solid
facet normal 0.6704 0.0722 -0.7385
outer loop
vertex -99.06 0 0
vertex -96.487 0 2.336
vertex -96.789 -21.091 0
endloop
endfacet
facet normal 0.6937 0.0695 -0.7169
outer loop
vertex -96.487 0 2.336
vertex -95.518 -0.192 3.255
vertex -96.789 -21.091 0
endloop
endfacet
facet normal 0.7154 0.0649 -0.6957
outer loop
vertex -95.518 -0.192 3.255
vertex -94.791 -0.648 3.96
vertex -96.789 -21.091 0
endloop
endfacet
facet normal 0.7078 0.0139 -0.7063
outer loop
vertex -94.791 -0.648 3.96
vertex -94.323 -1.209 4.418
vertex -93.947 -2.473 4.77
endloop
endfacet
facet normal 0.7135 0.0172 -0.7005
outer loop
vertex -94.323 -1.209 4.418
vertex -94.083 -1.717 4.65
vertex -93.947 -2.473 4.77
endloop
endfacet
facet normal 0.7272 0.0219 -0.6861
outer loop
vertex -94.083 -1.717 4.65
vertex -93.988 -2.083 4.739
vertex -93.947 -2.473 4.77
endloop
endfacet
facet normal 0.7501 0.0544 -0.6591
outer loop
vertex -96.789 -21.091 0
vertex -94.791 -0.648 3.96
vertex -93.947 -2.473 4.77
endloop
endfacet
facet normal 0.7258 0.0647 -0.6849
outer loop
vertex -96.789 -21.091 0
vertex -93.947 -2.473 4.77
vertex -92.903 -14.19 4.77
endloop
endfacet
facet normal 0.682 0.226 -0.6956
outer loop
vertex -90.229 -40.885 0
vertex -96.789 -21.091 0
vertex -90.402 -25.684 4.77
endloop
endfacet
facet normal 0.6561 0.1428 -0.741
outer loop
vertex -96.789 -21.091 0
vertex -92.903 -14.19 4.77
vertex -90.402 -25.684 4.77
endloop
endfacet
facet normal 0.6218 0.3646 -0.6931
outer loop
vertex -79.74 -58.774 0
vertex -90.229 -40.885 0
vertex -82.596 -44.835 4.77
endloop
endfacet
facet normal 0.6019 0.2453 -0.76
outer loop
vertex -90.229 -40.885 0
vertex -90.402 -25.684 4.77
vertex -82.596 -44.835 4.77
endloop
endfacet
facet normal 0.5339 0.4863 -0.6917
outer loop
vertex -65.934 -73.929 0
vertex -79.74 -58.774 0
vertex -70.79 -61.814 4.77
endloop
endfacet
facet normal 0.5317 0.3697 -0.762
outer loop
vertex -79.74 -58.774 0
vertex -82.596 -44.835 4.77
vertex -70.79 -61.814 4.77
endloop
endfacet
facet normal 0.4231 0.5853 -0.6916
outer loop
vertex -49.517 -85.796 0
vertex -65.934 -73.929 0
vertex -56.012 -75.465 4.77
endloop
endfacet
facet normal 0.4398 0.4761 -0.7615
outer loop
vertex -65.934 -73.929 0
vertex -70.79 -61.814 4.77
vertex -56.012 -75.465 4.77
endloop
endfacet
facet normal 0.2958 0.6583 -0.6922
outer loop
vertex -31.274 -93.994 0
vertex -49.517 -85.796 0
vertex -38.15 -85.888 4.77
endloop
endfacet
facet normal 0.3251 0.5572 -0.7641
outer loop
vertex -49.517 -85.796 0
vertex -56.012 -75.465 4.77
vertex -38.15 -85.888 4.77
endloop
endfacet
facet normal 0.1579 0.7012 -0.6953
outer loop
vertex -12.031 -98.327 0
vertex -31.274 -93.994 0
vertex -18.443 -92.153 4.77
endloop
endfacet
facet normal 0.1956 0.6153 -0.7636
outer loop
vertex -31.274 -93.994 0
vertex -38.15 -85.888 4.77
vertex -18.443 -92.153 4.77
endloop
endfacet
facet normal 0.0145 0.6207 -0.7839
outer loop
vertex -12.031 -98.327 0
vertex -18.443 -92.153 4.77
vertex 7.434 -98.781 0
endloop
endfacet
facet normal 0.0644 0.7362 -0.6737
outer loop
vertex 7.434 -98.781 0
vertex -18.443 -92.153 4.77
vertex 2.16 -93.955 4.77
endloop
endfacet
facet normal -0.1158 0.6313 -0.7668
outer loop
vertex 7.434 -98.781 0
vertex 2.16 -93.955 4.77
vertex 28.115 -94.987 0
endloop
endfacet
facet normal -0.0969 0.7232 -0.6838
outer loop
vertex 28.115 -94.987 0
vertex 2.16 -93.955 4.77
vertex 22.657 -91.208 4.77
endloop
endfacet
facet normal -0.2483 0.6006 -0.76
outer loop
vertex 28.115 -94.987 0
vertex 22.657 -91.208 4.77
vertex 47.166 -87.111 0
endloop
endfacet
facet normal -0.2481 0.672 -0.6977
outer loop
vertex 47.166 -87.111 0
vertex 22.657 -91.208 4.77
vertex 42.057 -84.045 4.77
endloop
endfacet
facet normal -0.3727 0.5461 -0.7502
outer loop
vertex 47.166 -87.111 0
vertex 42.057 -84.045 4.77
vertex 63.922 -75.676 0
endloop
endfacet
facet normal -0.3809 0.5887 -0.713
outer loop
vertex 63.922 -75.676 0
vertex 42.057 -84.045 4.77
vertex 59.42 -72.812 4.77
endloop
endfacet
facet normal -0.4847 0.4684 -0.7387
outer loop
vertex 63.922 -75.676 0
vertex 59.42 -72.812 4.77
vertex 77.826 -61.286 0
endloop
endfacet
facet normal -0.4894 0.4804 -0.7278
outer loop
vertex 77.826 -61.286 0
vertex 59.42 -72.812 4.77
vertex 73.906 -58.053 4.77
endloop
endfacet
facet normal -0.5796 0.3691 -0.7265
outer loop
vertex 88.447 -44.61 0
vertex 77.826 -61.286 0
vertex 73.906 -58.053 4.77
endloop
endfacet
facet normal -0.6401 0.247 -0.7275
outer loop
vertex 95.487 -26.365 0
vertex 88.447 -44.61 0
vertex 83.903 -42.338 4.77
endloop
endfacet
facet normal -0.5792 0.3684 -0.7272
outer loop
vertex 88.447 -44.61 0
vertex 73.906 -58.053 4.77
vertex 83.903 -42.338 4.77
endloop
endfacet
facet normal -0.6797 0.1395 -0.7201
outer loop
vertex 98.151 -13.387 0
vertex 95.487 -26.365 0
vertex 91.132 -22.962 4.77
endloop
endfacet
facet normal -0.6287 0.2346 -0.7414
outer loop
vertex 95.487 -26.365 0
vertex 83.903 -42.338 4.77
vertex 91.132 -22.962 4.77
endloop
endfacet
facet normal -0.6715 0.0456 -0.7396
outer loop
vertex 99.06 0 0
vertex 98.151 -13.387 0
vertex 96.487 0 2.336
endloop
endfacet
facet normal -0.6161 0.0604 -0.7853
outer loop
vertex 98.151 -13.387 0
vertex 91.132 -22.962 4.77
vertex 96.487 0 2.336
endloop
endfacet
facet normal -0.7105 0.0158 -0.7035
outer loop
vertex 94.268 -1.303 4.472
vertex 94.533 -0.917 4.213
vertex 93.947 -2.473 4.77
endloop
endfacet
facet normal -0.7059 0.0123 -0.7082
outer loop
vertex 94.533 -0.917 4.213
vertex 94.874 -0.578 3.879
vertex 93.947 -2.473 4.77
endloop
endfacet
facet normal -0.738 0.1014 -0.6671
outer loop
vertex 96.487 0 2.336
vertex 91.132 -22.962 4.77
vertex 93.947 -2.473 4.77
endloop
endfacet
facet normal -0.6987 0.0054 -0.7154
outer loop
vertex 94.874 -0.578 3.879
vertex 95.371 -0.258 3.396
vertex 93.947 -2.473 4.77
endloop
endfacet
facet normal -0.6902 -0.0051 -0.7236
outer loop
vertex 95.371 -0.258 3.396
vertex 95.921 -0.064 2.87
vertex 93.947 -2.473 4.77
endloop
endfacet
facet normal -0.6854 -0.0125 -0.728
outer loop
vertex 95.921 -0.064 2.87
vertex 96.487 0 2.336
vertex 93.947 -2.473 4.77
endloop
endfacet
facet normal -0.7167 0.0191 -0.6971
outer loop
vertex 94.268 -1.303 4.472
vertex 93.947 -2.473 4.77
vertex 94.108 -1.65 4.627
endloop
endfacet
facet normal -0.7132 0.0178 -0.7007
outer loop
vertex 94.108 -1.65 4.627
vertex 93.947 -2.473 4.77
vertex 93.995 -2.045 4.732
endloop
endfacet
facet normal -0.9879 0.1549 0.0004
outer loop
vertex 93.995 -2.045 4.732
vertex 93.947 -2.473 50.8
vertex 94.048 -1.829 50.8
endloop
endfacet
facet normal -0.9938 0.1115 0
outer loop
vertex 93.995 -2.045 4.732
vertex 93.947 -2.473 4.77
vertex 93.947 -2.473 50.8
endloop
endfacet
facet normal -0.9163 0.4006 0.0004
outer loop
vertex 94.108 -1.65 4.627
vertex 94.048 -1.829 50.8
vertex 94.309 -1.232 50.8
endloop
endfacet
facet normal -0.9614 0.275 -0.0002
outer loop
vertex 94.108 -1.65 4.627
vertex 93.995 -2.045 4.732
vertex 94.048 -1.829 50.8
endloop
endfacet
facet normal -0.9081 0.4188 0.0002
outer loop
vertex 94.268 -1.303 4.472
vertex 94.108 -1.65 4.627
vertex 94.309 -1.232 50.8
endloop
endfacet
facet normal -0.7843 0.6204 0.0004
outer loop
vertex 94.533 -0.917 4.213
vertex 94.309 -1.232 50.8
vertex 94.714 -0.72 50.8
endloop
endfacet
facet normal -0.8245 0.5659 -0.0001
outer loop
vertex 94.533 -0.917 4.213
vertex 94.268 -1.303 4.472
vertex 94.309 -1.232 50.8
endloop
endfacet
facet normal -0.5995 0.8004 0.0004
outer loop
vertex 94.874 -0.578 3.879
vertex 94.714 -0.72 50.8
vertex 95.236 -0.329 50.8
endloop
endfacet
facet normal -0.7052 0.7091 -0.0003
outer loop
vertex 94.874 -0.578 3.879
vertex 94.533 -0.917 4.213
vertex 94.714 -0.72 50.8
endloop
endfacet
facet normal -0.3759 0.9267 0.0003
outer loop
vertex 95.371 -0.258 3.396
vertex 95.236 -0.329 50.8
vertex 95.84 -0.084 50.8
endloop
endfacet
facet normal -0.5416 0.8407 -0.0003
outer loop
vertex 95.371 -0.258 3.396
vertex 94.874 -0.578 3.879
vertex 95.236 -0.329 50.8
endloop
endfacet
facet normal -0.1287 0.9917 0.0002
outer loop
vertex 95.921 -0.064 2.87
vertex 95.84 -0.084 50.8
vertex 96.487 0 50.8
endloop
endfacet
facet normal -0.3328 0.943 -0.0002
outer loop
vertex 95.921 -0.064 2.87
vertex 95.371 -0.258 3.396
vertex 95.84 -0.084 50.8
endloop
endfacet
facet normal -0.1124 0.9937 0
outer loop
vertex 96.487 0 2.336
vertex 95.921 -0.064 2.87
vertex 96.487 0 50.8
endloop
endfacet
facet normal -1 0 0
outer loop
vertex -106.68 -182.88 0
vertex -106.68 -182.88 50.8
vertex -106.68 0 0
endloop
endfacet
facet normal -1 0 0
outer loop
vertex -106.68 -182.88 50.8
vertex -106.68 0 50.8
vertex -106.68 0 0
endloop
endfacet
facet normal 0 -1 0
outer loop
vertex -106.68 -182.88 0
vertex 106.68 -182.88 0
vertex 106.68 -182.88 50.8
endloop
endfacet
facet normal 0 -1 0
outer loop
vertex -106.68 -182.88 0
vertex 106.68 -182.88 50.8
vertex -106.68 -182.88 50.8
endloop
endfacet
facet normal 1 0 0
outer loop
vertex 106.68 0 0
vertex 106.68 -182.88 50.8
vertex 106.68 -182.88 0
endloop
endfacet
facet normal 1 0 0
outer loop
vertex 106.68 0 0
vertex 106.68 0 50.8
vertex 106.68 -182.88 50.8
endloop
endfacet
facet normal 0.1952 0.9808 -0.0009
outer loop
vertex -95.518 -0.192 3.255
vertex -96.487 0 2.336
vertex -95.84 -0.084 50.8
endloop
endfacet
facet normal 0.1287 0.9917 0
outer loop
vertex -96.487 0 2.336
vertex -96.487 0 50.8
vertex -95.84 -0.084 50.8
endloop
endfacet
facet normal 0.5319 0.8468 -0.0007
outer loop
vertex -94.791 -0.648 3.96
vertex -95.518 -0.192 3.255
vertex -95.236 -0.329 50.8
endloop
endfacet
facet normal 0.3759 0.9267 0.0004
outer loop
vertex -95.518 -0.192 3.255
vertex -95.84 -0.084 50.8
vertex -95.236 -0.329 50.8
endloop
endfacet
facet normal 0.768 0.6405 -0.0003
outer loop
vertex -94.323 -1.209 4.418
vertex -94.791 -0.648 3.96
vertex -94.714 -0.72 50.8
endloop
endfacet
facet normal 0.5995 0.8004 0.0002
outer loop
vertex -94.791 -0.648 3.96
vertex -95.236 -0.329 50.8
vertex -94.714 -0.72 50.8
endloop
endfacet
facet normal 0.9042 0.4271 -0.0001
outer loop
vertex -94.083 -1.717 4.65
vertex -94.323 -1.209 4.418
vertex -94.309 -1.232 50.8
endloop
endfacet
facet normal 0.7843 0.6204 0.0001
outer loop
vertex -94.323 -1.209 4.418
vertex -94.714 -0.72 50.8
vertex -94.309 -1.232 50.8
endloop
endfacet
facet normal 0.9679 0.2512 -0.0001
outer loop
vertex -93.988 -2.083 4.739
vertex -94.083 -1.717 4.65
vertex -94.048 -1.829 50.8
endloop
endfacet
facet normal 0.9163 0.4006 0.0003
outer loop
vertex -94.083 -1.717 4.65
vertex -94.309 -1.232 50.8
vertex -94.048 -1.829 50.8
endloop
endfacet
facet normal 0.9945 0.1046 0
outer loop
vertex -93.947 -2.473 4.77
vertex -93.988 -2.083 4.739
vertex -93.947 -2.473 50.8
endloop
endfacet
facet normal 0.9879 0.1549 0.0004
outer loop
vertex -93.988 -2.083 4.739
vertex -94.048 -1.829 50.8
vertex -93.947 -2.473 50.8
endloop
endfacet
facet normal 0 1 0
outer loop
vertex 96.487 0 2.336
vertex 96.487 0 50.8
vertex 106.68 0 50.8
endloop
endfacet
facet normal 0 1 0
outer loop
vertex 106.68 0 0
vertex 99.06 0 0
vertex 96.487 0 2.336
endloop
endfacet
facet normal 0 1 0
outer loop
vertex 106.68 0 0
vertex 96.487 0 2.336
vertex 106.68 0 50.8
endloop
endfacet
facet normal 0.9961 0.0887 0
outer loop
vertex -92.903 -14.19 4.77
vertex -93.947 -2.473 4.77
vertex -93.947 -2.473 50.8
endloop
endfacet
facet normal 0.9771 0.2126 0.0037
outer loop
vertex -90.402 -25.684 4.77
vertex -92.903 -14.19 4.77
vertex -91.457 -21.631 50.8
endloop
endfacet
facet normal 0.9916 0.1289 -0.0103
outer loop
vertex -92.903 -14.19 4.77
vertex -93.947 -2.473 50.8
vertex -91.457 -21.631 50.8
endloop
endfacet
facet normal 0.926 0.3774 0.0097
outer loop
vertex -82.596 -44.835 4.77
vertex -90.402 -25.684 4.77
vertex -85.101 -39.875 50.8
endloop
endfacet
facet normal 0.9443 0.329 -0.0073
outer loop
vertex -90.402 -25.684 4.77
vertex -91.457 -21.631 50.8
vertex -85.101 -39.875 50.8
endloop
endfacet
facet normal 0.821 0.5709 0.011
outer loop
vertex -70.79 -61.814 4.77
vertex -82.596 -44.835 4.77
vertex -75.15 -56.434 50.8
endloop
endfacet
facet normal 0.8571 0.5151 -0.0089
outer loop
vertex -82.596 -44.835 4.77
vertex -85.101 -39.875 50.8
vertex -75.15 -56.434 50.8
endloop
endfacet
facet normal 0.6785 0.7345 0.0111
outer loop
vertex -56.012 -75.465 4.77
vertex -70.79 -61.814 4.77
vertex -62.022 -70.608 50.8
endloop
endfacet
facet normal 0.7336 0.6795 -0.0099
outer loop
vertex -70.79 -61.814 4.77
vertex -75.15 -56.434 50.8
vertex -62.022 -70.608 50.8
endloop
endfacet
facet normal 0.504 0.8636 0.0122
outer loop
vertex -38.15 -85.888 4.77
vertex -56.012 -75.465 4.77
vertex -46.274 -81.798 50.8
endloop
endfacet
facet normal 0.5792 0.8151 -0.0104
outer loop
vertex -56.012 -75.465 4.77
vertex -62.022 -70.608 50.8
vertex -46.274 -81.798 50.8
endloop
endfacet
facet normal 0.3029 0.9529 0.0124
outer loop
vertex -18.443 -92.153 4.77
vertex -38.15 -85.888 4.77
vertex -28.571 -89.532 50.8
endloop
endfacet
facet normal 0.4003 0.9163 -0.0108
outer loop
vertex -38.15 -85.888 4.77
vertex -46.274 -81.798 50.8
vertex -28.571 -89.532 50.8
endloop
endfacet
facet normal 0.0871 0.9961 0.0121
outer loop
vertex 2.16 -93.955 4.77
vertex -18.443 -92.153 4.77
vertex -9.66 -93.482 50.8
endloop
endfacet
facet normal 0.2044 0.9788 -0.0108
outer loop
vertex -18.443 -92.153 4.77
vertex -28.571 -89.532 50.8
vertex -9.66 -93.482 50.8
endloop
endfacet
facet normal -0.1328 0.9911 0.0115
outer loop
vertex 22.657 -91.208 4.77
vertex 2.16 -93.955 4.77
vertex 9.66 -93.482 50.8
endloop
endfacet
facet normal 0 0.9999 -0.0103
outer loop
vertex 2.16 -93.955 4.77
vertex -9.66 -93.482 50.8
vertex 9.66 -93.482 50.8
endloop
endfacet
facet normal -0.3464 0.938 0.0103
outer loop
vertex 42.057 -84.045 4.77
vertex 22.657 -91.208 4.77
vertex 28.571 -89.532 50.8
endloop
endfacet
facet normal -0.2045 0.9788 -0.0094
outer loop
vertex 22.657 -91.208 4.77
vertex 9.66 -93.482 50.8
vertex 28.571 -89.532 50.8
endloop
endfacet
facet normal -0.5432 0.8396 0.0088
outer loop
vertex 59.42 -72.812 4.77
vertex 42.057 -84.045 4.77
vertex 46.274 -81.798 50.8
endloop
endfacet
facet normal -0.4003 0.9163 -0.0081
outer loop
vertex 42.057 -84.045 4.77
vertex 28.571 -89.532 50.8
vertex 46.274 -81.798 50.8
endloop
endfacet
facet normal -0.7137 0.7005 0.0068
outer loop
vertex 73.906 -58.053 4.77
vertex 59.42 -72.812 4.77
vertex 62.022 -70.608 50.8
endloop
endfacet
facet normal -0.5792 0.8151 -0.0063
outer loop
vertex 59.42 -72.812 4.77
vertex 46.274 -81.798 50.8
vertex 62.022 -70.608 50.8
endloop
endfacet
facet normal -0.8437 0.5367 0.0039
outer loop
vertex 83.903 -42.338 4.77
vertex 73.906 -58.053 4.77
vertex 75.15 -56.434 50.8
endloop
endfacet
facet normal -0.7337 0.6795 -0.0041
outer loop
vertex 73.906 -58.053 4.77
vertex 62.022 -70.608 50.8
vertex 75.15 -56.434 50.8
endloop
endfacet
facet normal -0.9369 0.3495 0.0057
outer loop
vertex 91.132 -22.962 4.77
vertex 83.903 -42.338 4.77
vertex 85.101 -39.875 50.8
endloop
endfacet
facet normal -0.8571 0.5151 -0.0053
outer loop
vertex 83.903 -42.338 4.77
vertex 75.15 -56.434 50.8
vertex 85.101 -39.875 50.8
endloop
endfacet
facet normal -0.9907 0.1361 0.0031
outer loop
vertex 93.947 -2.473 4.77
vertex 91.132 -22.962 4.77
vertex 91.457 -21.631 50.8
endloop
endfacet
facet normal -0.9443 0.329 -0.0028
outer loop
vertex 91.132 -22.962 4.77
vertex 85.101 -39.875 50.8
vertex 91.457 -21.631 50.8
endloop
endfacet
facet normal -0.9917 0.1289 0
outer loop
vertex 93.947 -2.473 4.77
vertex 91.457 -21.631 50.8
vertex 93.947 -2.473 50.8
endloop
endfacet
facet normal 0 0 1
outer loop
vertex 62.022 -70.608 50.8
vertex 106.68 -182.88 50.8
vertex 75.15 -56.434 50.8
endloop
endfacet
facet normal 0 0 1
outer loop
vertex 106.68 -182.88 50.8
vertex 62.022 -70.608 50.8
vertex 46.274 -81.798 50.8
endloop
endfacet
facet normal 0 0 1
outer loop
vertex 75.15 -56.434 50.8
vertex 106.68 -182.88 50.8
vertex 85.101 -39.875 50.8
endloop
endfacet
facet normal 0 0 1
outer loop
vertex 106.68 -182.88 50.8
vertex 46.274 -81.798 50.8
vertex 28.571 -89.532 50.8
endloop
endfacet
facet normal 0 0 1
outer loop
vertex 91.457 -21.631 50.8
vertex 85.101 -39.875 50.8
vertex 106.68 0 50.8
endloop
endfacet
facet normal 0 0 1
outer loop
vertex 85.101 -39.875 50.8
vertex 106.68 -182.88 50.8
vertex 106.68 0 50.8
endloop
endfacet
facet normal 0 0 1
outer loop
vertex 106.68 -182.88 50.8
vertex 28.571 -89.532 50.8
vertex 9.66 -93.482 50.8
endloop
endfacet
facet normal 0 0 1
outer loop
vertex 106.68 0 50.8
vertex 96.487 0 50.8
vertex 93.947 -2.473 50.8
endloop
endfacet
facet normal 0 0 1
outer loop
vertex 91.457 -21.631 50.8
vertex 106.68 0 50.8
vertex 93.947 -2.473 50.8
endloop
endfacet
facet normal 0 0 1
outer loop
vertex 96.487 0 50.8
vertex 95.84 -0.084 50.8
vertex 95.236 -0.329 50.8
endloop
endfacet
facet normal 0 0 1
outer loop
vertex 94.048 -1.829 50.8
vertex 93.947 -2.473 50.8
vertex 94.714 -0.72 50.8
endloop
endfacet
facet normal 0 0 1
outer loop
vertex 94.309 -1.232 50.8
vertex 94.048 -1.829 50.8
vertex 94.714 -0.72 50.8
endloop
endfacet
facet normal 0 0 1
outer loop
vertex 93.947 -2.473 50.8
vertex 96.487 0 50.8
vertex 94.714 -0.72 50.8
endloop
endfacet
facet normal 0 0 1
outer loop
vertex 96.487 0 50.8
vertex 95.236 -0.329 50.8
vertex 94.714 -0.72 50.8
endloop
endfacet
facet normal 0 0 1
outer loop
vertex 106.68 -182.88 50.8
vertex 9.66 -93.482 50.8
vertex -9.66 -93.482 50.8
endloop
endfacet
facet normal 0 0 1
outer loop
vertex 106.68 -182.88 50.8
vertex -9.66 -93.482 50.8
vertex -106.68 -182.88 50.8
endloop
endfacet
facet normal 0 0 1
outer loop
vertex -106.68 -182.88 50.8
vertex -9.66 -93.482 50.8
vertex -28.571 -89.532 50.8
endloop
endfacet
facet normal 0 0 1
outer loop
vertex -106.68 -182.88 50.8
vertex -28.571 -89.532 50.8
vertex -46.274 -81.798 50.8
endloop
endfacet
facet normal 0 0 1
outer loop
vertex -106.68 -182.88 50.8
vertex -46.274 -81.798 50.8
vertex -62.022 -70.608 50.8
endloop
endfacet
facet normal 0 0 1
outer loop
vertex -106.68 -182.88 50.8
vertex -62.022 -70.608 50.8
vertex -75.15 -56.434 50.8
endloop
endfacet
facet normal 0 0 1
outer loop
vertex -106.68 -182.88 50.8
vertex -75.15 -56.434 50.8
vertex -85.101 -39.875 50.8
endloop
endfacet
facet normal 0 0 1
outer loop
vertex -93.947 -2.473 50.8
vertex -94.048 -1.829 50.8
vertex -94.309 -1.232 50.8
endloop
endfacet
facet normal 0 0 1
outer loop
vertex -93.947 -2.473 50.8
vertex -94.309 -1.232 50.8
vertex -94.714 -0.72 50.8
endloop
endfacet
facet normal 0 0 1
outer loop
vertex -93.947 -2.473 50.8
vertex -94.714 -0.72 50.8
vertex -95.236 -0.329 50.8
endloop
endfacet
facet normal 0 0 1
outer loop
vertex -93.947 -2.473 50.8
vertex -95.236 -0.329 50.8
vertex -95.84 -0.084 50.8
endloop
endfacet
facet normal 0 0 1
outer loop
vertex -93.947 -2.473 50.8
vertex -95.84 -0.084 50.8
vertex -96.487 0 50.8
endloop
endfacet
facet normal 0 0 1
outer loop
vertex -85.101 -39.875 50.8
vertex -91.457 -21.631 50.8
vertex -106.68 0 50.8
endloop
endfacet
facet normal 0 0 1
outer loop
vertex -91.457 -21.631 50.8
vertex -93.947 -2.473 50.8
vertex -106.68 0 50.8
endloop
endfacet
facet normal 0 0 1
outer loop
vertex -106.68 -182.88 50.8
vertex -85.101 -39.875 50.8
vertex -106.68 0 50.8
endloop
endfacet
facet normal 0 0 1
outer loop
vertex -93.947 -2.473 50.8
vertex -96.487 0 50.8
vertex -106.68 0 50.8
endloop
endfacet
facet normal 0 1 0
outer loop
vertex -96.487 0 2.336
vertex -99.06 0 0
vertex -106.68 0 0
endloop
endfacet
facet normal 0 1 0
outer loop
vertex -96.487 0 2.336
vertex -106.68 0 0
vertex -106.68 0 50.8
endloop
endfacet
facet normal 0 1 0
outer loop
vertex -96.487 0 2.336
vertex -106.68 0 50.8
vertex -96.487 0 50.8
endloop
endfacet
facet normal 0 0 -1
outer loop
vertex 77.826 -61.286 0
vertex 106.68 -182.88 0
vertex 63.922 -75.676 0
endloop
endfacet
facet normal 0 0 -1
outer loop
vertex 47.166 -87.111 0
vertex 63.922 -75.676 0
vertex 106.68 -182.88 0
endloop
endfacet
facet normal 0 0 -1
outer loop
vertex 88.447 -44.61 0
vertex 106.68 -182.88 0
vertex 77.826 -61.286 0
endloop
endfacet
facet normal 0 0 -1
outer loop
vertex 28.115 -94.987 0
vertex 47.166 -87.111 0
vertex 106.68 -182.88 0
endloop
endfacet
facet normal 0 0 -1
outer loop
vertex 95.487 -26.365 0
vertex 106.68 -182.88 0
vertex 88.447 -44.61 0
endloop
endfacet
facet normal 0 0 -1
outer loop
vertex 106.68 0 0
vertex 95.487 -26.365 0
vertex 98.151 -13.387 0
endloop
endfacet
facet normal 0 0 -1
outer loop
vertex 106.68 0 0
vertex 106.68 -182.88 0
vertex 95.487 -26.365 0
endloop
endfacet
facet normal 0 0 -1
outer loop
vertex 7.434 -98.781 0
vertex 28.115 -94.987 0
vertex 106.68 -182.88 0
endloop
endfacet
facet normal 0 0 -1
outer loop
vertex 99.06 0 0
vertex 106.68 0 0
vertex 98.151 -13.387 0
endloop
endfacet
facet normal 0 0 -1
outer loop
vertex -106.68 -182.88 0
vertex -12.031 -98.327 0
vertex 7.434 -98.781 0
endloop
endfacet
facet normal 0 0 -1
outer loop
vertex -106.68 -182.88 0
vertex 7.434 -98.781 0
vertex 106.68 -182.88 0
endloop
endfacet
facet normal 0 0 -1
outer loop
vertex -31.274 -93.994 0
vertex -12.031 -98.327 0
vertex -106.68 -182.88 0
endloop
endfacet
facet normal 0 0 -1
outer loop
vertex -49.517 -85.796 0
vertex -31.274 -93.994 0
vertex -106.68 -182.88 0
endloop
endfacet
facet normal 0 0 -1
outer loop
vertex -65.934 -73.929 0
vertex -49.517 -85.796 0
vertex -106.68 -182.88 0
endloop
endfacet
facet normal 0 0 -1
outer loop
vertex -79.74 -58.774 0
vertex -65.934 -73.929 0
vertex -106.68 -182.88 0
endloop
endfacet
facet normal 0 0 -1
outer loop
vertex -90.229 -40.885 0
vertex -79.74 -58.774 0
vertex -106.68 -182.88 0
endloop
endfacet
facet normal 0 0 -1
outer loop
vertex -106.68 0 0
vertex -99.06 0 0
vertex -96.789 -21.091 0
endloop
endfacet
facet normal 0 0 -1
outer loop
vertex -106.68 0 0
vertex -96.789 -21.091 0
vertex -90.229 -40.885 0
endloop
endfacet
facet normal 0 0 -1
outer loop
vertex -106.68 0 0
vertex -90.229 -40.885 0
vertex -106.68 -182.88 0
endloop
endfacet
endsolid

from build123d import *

# Parameters (mm, degrees)
SKETCH2_W           = 213.36
SKETCH2_H           = 213.36
SKETCH2_R           = 93.98
BOSS_EXTRUDE1_DEPTH = 50.8
SKETCH4_W           = 431.498092941
SKETCH4_H           = 427.351859682
CUT_EXTRUDE1_DEPTH  = 106.68
FILLET1_R           = 2.54
SKETCH6_W           = 213.36
SKETCH6_H           = 50.8
BOSS_EXTRUDE3_DEPTH = 76.2


with BuildPart() as part:
    # Sketch2 → Boss-Extrude1 (new body)
    with BuildSketch(Plane.XY.offset(50.8)):
        Rectangle(SKETCH2_W, SKETCH2_H)
        Circle(SKETCH2_R, mode=Mode.SUBTRACT)
    extrude(amount=-BOSS_EXTRUDE1_DEPTH)

    # Cut-Loft1: read off the stored shape, not the designer's step
    # Cut-Loft1: loft between two sections, ruled curve by curve
    cut_loft1_from = [
        Edge.make_bspline([(-5.225836659, 98.922061398, 0), (-203.069959455, 88.47038808, 0), (-192.618286137, -109.373734716, 0), (5.225836659, -98.922061398, 0), (203.069959455, -88.47038808, 0), (192.618286137, 109.373734716, 0), (-5.225836659, 98.922061398, 0)], [0, 0, 0, 0, 0.5, 0.5, 0.5, 1, 1, 1, 1], 3, [1, 0.333333333, 0.333333333, 1, 0.333333333, 0.333333333, 1]),
    ]
    cut_loft1_to = [
        Edge.make_bspline([(82.069205503, 45.791766816, 50.8), (-9.514328128, 209.930177822, 50.8), (-173.652739134, 118.34664419, 50.8), (-82.069205503, -45.791766816, 50.8), (9.514328128, -209.930177822, 50.8), (173.652739134, -118.34664419, 50.8), (82.069205503, 45.791766816, 50.8)], [0, 0, 0, 0, 0.5, 0.5, 0.5, 1, 1, 1, 1], 3, [1, 0.333333333, 0.333333333, 1, 0.333333333, 0.333333333, 1]),
    ]
    cut_loft1 = Solid(Shell([*[Face.make_surface_from_curves(cut_loft1_from[k], cut_loft1_to[k]) for k in range(1)], Face(Wire(cut_loft1_from)), Face(Wire(cut_loft1_to))]))
    add(cut_loft1, mode=Mode.SUBTRACT)

    # Sketch4 → Cut-Extrude1 (cut)
    with BuildSketch(Plane(origin=(0, 106.68, 0), x_dir=(1, 0, 0), z_dir=(0, 1, 0))):
        with Locations((-43.743226098, -53.764043901)):
            Rectangle(SKETCH4_W, SKETCH4_H)
    extrude(amount=-CUT_EXTRUDE1_DEPTH, mode=Mode.SUBTRACT)

    # Fillet1
    fillet1_edges = [part.edges().sort_by_distance(p)[0] for p in [
        (93.98, 0, 27.785112978),
        (-93.98, 0, 27.785112678),
    ]]
    fillet(fillet1_edges, radius=FILLET1_R)

    # Sketch6 → Boss-Extrude3 (add)
    with BuildSketch(Plane(origin=(0, -106.68, 0), x_dir=(-1, 0, 0), z_dir=(0, -1, 0))):
        with Locations((0, -25.4)):
            Rectangle(SKETCH6_W, SKETCH6_H)
    extrude(amount=BOSS_EXTRUDE3_DEPTH)


solid = part.part
